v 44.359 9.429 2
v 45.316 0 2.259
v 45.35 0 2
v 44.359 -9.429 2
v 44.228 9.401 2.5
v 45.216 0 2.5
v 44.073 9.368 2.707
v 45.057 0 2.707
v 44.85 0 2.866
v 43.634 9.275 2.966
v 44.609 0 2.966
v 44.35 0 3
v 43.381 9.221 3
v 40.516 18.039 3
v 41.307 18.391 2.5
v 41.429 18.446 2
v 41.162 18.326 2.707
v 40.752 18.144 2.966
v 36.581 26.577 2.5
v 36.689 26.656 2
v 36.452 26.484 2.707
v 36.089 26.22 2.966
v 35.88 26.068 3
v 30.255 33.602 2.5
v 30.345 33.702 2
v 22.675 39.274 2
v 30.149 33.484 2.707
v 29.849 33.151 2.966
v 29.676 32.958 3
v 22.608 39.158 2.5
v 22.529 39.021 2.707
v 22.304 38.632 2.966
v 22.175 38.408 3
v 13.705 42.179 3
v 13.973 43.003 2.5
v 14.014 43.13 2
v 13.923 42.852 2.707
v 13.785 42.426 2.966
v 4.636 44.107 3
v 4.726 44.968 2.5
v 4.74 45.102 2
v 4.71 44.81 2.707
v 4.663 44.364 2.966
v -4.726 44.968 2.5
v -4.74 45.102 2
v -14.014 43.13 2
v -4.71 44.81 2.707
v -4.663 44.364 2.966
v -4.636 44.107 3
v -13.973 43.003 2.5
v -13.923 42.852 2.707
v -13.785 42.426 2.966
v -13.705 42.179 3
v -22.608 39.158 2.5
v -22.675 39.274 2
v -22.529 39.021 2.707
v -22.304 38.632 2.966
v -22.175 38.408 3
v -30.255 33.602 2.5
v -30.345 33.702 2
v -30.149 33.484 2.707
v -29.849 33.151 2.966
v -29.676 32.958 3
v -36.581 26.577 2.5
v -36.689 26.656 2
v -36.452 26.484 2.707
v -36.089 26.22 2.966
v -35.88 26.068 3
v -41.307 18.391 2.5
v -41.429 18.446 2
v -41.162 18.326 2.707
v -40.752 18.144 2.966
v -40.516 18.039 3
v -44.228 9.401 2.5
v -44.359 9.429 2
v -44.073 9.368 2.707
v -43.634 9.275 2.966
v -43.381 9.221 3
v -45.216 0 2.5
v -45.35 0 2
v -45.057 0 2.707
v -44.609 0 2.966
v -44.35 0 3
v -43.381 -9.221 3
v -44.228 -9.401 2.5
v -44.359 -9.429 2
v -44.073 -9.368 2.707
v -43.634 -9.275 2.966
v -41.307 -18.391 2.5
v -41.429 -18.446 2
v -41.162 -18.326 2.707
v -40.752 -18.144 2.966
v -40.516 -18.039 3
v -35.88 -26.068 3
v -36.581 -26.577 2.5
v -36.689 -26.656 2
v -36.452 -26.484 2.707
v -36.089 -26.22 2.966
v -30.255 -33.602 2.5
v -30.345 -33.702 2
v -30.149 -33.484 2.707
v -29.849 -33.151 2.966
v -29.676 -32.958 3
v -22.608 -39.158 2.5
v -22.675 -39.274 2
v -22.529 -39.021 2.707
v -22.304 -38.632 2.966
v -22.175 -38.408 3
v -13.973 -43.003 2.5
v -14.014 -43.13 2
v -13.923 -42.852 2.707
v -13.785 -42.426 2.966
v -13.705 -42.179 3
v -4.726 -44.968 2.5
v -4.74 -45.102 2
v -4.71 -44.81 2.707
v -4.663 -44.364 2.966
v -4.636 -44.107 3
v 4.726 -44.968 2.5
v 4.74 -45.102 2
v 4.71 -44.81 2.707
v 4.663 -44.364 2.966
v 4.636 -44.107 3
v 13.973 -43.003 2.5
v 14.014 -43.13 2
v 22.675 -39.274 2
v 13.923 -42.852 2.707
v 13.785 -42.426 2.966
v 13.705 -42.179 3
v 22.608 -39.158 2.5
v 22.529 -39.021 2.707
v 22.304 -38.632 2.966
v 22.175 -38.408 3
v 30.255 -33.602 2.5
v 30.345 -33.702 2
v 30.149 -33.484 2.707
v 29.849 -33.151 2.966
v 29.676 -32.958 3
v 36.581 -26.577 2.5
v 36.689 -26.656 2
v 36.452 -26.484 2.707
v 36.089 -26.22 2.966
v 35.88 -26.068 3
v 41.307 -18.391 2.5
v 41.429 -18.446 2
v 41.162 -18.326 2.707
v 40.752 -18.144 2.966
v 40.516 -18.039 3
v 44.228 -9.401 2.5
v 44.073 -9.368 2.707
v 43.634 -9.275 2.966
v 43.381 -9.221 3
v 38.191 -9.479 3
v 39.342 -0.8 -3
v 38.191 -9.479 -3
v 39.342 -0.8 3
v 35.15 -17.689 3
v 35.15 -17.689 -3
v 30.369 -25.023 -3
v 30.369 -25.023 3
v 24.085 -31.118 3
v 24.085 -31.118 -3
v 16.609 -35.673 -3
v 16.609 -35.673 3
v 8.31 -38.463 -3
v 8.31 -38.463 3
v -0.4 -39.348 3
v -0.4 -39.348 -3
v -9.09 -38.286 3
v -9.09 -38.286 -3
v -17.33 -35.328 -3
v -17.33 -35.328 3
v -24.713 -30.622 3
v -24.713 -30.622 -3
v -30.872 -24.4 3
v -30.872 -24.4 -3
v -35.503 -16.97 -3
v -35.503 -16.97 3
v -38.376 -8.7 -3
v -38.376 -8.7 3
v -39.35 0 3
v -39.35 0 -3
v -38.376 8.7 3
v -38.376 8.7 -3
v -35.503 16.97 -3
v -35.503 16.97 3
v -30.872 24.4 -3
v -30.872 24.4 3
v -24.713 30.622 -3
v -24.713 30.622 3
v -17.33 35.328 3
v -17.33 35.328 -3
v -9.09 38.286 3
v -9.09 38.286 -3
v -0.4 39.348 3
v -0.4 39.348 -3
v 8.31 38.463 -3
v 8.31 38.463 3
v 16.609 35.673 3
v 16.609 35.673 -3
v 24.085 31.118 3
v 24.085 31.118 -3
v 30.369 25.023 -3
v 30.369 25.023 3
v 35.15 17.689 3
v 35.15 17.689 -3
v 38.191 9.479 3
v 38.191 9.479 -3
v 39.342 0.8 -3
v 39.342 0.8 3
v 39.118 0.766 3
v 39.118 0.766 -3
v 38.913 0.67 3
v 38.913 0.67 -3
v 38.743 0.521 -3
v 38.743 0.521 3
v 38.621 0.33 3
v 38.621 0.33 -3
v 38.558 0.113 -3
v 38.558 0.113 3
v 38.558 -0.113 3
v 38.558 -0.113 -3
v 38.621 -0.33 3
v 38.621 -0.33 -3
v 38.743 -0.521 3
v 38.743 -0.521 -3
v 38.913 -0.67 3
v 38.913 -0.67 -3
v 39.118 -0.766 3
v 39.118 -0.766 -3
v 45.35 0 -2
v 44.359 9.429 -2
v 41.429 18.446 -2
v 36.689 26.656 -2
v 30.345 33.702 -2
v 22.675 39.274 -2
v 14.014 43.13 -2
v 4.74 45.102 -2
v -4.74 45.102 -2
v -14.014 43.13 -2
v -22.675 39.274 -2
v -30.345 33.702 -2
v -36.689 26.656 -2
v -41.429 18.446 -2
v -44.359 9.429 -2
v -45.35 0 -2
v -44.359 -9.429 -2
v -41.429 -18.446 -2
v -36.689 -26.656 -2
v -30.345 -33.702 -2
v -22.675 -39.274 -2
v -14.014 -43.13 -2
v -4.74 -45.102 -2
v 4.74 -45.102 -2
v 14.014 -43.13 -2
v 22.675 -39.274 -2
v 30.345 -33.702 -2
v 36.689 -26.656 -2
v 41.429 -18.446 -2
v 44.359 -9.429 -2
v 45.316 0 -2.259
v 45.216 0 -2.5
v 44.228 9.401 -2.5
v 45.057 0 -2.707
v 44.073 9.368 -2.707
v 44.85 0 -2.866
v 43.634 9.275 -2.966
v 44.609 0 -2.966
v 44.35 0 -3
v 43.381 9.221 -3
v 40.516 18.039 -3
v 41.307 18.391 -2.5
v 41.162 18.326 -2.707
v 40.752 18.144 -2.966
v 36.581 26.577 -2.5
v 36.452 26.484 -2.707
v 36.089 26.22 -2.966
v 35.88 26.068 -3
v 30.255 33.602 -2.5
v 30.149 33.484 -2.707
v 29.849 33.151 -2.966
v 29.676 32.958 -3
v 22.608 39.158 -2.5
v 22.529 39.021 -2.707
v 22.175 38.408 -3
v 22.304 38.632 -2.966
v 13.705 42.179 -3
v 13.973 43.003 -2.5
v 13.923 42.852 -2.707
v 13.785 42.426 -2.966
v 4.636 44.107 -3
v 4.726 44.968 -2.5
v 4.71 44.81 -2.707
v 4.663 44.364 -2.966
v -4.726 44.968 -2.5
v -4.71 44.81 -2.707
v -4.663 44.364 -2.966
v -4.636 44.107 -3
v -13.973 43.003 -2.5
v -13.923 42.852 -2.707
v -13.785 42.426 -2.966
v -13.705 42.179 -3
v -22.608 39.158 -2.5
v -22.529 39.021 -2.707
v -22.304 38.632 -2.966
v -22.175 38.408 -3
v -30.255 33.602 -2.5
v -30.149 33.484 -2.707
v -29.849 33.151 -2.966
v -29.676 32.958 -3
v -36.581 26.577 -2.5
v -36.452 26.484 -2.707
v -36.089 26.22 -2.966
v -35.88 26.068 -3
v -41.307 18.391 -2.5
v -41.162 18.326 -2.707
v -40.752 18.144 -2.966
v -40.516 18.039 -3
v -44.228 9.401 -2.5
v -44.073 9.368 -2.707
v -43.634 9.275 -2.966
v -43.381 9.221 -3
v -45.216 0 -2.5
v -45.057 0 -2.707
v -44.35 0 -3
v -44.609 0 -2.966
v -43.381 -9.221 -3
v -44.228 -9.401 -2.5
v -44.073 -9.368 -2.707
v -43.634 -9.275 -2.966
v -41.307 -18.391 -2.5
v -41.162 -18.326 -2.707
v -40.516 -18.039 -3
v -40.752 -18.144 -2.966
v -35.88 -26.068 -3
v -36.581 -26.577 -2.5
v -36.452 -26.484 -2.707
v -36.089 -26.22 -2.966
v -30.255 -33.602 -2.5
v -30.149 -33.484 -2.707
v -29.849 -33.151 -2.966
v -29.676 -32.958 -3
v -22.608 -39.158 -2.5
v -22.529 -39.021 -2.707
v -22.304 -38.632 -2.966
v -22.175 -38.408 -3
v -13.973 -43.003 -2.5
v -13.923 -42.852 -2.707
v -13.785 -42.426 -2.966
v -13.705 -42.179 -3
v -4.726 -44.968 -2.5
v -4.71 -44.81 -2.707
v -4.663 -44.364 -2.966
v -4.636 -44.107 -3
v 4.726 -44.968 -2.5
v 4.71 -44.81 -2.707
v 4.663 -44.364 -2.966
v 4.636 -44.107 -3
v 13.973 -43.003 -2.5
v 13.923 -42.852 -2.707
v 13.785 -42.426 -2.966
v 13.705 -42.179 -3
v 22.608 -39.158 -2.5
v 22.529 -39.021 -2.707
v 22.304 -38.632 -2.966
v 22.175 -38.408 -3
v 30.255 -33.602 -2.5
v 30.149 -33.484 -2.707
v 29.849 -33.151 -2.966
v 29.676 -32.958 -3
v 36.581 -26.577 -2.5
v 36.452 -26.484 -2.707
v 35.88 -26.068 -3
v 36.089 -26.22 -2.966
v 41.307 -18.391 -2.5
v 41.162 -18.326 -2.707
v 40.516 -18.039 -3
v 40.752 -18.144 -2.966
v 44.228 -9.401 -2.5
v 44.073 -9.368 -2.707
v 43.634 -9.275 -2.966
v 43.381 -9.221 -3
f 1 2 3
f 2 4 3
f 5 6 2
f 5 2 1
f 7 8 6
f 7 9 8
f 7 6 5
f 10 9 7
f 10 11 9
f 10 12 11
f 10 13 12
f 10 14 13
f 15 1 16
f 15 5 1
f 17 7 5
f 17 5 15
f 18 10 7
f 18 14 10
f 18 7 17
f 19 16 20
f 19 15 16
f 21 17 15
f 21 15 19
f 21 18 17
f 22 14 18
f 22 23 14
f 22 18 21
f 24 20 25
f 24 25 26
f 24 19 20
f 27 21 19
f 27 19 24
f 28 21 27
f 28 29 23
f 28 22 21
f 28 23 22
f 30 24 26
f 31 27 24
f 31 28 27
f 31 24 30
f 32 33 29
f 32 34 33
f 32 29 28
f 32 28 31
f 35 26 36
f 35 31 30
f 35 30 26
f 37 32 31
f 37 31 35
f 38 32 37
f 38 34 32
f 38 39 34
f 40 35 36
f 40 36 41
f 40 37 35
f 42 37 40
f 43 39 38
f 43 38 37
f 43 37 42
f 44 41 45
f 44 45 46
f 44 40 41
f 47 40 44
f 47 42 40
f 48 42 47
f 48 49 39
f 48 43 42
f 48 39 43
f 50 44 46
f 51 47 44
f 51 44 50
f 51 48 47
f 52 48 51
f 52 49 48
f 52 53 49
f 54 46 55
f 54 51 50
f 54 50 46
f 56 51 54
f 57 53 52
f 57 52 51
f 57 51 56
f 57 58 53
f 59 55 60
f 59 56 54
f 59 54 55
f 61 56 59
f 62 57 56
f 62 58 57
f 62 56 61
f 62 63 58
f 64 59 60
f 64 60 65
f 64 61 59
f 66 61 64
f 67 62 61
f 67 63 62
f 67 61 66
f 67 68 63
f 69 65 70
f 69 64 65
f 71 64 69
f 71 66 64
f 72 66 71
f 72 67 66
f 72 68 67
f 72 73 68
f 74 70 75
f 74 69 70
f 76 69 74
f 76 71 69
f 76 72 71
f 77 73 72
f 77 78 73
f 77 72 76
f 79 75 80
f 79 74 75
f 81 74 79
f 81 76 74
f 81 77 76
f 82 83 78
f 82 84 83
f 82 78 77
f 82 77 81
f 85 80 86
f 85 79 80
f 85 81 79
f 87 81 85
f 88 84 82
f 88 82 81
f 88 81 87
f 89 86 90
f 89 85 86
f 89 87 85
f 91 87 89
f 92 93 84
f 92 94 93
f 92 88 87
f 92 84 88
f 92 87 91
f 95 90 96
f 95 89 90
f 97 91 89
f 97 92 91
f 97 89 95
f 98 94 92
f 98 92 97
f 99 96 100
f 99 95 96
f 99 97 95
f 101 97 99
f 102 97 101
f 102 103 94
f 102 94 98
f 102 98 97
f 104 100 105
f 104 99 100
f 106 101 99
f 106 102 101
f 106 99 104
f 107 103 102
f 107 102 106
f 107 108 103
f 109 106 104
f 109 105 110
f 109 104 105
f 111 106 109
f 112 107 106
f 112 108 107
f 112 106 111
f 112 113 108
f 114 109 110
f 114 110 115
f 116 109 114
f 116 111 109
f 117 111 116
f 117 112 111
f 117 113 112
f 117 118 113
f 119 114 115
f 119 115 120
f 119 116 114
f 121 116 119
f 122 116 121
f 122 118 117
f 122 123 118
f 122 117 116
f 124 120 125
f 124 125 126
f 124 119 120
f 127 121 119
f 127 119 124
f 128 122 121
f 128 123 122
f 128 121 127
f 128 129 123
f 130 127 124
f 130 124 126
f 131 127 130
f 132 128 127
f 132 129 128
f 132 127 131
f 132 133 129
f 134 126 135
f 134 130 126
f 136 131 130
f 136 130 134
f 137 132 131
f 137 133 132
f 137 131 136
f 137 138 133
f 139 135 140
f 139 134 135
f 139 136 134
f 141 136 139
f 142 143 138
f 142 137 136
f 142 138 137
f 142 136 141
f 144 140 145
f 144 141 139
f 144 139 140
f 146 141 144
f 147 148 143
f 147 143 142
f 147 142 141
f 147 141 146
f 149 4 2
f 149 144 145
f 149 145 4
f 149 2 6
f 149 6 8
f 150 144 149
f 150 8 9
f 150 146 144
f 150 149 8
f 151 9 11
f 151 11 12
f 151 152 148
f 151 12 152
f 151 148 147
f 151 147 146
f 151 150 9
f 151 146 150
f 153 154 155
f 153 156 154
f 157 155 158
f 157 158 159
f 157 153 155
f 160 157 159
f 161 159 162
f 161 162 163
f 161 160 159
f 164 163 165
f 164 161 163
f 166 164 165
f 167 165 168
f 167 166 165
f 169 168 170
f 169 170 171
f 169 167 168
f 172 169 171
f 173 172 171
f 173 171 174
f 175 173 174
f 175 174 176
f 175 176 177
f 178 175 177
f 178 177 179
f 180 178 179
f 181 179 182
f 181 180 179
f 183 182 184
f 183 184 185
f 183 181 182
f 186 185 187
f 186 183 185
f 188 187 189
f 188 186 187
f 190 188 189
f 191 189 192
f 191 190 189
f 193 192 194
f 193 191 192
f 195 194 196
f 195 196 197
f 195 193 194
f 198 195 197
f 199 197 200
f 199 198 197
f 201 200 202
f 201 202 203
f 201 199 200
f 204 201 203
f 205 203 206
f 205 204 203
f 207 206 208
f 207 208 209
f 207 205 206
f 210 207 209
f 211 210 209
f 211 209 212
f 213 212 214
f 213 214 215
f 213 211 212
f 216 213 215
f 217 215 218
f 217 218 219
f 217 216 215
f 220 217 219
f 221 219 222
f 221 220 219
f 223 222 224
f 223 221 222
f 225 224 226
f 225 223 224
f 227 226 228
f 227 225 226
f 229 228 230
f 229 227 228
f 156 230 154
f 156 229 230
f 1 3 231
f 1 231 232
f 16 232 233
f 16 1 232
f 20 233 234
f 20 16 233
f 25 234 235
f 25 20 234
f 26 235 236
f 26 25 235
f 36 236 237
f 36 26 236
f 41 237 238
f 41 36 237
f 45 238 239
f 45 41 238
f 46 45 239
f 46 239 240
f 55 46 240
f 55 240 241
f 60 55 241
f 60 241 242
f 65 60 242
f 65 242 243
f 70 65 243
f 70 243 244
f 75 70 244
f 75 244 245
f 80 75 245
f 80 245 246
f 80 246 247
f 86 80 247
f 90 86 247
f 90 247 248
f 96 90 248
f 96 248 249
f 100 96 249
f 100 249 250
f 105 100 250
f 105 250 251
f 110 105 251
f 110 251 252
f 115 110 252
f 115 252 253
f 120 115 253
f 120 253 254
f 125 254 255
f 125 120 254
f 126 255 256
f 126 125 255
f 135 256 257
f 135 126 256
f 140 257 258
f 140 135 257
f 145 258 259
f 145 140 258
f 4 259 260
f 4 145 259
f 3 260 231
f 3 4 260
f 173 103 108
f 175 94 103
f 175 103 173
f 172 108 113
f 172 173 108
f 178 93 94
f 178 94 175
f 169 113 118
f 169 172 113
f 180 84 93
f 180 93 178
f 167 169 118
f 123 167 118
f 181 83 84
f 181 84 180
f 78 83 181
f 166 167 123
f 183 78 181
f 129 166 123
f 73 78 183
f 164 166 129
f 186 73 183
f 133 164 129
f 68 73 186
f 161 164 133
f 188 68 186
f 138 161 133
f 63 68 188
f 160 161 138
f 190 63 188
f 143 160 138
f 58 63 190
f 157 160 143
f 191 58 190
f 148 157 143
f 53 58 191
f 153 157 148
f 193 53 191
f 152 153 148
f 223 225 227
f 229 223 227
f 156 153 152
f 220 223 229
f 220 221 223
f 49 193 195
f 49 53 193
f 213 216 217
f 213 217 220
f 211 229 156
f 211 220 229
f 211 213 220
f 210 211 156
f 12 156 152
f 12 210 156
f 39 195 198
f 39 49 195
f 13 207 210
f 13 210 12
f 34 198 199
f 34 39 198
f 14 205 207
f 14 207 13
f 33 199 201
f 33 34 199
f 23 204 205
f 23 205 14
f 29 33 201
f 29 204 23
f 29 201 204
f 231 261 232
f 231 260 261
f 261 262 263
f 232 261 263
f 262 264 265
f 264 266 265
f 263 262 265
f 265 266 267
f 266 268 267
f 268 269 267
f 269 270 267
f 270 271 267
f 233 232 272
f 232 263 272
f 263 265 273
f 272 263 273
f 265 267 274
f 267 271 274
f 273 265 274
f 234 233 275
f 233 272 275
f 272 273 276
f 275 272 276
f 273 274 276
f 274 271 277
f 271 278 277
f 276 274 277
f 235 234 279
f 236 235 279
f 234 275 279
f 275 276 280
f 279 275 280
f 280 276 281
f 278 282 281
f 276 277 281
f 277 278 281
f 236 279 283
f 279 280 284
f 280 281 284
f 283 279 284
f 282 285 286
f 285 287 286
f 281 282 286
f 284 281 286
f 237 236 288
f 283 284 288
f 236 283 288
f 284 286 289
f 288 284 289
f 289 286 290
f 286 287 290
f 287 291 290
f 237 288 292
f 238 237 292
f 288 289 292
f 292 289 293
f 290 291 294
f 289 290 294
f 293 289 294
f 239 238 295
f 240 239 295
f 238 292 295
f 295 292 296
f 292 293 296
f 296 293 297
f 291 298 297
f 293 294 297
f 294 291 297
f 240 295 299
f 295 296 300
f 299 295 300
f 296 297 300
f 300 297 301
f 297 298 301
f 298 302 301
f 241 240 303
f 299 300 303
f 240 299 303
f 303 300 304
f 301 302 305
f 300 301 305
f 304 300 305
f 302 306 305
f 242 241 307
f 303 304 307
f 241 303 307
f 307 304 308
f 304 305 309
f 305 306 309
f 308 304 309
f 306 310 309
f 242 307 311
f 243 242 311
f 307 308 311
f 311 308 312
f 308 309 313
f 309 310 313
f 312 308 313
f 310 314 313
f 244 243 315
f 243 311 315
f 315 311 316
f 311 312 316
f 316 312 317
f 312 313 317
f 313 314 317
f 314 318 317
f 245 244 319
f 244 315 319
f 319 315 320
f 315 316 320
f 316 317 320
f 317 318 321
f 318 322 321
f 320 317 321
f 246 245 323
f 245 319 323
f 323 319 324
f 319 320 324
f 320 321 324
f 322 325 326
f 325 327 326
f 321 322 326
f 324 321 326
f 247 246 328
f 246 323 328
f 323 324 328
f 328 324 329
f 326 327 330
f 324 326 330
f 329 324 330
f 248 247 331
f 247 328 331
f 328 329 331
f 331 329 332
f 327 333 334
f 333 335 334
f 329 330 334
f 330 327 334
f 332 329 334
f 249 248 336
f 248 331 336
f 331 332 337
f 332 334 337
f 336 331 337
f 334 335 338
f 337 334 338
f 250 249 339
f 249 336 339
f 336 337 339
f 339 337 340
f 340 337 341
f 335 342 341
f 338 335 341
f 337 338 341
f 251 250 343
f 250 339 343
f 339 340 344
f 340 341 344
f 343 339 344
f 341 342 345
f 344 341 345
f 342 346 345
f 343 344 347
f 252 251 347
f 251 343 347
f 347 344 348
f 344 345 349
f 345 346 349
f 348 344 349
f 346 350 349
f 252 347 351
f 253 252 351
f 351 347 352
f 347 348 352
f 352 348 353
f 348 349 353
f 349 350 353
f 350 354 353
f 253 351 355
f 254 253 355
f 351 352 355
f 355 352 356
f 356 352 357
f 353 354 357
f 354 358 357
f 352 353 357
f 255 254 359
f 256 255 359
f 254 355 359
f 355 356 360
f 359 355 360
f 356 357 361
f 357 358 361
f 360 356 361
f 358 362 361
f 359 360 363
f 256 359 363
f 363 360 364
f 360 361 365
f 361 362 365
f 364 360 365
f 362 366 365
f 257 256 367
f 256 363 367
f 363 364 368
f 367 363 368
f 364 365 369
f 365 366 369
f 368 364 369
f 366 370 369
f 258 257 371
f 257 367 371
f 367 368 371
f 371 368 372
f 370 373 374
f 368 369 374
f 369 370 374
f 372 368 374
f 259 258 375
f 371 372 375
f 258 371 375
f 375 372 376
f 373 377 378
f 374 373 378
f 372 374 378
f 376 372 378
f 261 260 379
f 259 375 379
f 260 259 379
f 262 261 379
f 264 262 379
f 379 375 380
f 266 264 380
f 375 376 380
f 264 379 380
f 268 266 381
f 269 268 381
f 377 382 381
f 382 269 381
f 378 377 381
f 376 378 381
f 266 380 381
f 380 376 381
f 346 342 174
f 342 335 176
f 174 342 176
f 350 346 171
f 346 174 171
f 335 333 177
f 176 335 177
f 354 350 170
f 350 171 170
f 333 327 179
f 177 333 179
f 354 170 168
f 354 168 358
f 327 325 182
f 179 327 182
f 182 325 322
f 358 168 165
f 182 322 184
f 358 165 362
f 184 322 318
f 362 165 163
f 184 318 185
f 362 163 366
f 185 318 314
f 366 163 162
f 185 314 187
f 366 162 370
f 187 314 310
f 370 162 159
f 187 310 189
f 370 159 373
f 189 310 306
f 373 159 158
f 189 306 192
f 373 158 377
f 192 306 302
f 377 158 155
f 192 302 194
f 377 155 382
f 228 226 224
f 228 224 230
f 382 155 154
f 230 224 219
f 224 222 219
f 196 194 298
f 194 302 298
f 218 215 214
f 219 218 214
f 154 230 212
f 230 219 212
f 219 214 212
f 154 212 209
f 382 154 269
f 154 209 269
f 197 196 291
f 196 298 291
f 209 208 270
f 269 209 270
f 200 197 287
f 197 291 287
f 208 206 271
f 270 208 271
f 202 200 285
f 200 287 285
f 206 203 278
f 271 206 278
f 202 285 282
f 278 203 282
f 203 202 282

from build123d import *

# Parameters (mm, degrees)
F1_R     = 45.35
F2_DEPTH = 3
F4_R     = 1


with BuildPart() as f2:
    # F1 (on Top) → F2 (new body, symmetric)
    with BuildSketch(Plane.XY):
        Circle(F1_R)
        with BuildLine():
            ThreePointArc((39.3418678526, 0.7999586665), (39.3479669106, 0.4), (39.35, 0))
            ThreePointArc((39.35, 0), (39.3479669106, -0.4), (39.3418678526, -0.7999586665))
            ThreePointArc((39.3418678526, -0.7999586665), (-39.35, 0), (39.3418678526, 0.7999586665))
        make_face(mode=Mode.SUBTRACT)
        with BuildLine():
            ThreePointArc((39.3418678526, -0.7999586665), (39.3479669106, -0.4), (39.35, 0))
            ThreePointArc((39.35, 0), (39.3479669106, 0.4), (39.3418678526, 0.7999586665))
            ThreePointArc((39.3418678526, 0.7999586665), (38.55, 0), (39.3418678526, -0.7999586665))
        make_face()
    extrude(amount=F2_DEPTH, both=True)

    # F4
    f4_edges = [f2.edges().sort_by_distance(p)[0] for p in [
        (-45.35, 0, 3),
        (-45.35, 0, -3),
    ]]
    fillet(f4_edges, radius=F4_R)


solid = f2.part
